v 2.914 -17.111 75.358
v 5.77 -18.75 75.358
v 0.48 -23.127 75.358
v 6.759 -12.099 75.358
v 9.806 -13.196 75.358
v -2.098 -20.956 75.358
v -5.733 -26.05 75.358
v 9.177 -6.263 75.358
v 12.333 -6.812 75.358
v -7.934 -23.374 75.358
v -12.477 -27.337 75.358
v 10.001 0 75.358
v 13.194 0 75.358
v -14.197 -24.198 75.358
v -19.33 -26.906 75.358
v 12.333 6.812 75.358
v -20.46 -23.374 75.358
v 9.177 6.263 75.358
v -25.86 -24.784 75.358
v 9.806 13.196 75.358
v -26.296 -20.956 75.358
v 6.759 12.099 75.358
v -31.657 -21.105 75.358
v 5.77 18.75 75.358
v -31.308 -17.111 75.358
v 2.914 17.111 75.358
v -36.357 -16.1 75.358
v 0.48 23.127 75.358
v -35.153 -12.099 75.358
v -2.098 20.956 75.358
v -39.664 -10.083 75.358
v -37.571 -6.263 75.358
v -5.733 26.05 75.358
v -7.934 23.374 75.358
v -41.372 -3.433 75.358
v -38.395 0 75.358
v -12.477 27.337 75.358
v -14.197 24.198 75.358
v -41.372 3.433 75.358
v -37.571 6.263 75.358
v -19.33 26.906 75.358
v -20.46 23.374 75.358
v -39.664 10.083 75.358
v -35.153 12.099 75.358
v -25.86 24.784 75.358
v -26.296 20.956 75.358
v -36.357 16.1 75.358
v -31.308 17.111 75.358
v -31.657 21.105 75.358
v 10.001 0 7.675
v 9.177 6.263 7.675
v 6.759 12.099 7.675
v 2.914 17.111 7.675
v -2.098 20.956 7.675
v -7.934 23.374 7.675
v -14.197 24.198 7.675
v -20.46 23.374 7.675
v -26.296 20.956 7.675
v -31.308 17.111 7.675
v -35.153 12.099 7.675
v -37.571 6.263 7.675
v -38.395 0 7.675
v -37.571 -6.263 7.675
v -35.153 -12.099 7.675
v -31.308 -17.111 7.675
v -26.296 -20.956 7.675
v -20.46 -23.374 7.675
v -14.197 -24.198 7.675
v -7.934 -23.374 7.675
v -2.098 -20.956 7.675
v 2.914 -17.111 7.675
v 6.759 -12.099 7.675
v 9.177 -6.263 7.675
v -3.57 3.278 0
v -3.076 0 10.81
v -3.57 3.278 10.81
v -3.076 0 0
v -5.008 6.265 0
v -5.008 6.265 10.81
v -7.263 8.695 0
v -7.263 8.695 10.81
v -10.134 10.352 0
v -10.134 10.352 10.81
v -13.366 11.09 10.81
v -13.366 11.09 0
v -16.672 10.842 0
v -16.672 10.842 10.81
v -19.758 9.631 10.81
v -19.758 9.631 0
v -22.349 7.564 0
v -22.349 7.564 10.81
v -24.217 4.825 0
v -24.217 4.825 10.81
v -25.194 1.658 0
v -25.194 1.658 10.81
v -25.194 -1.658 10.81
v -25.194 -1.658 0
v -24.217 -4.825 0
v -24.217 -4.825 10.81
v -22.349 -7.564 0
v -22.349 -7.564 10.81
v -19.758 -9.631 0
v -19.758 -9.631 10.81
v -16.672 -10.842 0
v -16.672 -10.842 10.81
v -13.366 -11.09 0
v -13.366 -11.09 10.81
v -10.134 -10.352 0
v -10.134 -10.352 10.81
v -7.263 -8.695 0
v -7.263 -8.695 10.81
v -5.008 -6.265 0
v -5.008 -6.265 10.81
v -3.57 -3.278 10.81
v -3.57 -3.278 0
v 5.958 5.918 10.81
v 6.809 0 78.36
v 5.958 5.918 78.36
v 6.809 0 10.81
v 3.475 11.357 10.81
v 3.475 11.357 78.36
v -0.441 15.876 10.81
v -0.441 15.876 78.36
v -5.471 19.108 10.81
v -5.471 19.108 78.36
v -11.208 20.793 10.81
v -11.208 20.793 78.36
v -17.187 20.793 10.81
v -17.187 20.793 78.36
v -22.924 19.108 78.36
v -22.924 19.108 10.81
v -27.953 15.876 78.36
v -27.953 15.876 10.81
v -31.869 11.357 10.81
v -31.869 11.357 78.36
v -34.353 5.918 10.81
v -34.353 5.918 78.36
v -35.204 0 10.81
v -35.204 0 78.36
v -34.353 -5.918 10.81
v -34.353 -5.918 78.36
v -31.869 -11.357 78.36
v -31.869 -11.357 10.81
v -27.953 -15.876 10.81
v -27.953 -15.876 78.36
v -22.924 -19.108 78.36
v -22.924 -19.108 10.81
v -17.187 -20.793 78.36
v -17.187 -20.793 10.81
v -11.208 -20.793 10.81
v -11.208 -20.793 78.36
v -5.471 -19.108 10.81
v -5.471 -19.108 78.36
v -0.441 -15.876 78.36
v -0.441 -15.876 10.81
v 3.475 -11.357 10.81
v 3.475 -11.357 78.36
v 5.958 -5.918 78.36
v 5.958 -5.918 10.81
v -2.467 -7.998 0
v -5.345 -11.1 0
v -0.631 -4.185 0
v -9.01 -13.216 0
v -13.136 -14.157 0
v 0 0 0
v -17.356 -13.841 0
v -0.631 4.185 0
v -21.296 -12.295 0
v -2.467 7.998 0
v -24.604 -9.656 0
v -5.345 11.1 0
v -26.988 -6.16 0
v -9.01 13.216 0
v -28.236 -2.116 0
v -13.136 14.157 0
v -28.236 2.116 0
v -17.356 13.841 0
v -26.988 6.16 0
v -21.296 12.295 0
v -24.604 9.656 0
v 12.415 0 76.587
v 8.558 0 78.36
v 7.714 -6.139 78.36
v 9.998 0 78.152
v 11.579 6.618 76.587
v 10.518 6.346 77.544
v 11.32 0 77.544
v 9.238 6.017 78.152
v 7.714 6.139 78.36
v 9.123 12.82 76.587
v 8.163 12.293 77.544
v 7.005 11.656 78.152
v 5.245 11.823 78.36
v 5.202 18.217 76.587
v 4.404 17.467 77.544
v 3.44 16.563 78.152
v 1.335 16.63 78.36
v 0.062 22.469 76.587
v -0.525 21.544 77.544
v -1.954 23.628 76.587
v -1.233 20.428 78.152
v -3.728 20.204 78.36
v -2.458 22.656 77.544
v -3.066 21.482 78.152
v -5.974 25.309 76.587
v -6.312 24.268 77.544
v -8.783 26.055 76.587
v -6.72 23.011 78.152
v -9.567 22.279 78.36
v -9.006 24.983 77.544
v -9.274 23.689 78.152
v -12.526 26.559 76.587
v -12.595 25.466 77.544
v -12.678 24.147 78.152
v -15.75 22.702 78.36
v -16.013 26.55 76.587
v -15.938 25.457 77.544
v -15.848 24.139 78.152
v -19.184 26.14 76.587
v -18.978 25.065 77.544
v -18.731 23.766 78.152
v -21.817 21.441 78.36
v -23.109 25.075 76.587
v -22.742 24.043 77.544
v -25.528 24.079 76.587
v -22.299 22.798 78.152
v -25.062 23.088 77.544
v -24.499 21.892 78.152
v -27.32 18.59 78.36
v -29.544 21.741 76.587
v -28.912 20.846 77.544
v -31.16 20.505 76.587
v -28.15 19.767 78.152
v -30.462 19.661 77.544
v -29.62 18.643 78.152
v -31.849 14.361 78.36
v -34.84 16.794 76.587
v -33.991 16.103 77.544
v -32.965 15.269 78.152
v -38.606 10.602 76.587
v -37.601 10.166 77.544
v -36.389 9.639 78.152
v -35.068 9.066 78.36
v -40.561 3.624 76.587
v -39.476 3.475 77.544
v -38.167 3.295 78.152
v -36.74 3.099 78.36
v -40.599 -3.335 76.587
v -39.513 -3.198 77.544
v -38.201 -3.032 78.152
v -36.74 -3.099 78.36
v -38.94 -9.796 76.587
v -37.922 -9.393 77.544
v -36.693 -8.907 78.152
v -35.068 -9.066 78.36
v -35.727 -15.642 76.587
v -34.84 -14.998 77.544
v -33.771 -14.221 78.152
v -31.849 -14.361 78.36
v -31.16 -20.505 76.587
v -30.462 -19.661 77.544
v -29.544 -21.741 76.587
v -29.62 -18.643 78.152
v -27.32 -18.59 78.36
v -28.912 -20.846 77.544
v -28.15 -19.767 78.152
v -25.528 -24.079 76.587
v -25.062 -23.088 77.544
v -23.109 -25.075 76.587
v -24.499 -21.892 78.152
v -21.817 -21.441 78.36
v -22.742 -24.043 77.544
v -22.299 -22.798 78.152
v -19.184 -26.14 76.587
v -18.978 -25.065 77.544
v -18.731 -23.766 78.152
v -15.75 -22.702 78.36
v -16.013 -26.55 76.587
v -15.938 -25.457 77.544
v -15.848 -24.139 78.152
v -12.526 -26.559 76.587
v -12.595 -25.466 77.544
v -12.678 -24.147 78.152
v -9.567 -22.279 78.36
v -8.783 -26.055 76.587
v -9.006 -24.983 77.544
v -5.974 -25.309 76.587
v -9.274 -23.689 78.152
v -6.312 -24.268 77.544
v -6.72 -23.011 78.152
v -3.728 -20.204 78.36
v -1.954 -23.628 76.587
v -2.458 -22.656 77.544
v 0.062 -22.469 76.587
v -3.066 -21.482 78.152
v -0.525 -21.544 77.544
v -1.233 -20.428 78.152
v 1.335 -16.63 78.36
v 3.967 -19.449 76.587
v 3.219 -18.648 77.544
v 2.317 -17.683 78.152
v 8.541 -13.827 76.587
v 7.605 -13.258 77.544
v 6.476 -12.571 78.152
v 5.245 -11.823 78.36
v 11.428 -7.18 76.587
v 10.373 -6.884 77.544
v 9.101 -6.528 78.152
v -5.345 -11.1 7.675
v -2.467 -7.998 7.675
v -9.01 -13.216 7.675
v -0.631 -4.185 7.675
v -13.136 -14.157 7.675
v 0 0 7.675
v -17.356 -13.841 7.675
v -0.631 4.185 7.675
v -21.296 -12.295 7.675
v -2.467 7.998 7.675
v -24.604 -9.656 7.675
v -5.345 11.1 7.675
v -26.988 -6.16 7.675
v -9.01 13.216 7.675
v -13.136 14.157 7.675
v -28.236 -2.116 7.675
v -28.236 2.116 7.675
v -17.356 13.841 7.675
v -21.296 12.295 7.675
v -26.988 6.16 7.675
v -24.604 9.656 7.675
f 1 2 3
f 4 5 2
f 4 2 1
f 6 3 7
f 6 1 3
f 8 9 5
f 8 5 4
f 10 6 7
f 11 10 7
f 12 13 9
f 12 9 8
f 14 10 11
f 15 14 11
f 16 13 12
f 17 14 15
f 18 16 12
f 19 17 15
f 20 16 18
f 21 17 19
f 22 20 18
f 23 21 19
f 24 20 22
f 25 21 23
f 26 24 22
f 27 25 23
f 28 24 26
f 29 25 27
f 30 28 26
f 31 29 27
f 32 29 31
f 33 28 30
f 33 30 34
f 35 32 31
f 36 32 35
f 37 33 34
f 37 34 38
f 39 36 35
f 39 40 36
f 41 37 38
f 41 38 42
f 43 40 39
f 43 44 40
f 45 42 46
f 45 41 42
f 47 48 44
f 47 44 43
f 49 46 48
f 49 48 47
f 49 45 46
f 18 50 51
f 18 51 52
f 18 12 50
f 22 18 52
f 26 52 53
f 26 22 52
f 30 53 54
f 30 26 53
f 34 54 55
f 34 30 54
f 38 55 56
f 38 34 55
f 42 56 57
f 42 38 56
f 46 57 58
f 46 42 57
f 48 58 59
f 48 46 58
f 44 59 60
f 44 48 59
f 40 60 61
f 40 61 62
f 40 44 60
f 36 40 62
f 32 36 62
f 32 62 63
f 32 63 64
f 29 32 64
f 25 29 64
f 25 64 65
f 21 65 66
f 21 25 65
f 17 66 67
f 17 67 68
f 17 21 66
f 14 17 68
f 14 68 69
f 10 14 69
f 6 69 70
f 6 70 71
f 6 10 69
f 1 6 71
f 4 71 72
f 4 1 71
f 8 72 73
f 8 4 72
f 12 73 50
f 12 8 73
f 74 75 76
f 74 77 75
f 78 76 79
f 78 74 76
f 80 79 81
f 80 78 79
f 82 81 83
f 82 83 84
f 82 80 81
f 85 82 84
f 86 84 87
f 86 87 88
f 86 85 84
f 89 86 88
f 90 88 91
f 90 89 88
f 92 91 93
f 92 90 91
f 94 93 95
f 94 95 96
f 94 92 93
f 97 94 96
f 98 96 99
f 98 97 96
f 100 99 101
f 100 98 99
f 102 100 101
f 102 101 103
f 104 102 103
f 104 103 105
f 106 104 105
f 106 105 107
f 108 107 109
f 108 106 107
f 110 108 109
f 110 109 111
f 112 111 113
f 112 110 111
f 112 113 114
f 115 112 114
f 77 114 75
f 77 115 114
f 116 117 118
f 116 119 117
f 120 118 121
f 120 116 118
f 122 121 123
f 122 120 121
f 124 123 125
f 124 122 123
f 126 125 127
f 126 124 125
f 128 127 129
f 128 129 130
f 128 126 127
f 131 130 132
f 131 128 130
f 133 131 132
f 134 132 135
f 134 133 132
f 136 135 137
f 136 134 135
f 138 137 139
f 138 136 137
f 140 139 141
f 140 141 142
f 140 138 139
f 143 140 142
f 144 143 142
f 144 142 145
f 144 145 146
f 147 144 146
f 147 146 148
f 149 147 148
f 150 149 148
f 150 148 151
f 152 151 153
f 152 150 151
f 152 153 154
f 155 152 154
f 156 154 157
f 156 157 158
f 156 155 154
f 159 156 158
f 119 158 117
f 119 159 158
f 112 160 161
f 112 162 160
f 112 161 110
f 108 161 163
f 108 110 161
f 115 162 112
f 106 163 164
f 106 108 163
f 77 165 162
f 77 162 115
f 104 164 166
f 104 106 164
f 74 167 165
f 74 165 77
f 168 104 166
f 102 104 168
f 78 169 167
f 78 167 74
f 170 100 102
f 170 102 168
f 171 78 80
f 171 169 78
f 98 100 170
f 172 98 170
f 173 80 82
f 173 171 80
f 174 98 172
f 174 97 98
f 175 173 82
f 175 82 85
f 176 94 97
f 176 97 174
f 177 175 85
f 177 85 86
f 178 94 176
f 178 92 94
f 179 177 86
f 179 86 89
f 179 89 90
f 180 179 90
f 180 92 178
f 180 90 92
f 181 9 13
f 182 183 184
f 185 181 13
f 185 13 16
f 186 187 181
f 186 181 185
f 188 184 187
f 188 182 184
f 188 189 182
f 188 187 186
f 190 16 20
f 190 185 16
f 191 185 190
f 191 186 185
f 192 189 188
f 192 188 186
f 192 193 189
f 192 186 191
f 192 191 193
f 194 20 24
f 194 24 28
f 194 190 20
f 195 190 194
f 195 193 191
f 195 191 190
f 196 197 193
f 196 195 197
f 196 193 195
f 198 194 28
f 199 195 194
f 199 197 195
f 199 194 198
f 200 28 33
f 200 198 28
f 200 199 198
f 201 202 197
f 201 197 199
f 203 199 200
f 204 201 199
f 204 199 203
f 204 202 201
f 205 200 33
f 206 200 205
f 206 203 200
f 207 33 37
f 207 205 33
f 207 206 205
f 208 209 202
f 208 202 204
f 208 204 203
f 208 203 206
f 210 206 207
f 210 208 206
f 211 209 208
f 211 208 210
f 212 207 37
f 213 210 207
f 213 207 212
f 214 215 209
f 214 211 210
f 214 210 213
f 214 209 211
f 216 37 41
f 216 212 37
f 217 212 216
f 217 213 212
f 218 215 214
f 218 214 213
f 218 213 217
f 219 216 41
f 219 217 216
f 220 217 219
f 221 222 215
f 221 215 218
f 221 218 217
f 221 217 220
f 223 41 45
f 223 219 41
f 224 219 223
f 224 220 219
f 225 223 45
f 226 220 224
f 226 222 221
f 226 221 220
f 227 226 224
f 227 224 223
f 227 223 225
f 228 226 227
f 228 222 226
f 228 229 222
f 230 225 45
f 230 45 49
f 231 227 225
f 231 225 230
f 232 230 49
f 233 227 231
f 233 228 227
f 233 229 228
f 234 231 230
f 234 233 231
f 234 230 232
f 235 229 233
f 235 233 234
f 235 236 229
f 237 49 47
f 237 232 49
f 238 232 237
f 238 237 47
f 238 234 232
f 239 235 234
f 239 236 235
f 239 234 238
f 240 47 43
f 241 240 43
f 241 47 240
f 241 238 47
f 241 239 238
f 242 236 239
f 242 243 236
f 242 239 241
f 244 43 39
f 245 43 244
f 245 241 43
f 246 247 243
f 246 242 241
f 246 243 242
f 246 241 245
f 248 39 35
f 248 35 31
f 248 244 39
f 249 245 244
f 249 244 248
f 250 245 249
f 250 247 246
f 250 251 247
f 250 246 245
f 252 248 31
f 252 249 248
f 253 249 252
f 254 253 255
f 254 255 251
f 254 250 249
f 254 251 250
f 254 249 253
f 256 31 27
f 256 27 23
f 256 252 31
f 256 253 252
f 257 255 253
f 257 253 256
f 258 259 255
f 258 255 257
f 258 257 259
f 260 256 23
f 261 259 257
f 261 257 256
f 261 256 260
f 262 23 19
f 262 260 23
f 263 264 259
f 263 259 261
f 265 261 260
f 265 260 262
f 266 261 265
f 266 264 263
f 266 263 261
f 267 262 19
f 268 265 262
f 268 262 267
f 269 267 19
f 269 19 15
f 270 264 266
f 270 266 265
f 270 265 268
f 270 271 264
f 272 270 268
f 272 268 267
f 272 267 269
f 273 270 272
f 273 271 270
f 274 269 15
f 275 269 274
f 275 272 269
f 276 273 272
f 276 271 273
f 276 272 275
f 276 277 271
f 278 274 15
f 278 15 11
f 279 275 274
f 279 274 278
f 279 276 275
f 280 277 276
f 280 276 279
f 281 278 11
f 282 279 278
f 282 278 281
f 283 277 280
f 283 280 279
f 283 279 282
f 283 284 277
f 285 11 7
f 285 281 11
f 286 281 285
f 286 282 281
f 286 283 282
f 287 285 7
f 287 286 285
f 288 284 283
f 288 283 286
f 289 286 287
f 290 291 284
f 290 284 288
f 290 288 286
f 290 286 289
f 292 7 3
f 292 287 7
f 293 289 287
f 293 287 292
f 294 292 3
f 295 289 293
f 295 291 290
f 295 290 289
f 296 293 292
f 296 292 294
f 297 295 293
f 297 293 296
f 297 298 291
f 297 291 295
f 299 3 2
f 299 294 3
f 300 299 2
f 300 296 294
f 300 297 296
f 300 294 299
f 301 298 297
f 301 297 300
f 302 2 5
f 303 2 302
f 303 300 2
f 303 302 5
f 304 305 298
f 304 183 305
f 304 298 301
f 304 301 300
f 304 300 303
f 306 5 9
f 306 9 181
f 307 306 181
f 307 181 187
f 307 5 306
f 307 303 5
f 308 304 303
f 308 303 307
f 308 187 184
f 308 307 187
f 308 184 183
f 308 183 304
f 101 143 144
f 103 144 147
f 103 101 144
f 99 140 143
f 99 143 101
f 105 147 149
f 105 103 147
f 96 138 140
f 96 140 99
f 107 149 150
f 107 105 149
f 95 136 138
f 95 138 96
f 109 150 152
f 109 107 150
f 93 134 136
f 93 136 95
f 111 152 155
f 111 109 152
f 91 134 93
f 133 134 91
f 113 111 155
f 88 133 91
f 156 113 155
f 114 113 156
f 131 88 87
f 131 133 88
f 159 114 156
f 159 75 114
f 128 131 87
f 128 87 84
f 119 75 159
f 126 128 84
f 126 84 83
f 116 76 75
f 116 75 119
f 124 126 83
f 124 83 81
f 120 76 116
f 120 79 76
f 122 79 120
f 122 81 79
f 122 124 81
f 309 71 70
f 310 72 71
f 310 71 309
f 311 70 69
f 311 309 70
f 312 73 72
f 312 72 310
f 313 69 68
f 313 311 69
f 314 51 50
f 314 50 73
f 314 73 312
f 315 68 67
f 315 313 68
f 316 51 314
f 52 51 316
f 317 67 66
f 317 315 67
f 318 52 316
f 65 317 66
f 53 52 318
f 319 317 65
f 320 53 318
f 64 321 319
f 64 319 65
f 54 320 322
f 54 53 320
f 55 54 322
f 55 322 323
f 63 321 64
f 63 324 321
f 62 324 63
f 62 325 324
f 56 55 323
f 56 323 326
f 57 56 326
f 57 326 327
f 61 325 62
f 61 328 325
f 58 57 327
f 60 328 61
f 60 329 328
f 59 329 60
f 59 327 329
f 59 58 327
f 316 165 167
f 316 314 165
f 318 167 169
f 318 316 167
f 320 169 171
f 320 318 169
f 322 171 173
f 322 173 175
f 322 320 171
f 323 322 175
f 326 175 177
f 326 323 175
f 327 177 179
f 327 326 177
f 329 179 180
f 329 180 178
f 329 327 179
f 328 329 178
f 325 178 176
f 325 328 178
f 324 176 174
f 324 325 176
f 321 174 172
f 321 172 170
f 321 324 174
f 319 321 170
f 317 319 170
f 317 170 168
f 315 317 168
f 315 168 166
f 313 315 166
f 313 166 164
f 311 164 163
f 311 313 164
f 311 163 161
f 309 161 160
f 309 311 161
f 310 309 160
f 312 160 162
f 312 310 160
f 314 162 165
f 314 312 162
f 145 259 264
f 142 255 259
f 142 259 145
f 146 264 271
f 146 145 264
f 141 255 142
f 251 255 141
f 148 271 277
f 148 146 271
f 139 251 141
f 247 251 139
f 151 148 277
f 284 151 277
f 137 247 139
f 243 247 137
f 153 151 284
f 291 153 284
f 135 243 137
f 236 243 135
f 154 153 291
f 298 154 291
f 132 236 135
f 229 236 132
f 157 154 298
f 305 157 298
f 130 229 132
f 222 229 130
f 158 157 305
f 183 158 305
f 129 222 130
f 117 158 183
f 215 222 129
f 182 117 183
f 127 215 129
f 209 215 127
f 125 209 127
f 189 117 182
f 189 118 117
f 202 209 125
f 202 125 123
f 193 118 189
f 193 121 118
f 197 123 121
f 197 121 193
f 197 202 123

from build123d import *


# Not quite as in the source:
# - a fillet or chamfer that OpenCascade refuses, or shapes differently, is made with other operations: its cross-section is extruded or revolved along the edge and cut away or added


with BuildPart() as f1:
    # F0 (on Front) → F1 (revolve)
    with BuildSketch(Plane.XZ):
        Polygon((-3.0760182999, 0), (0, 0), (0, 7.6753781177), (10.0012486801, 7.6753781177), (10.0012486801, 75.3582566977), (13.1937107071, 75.3582566977), (13.1937107071, 78.3602893353), (6.8093864247, 78.3602893353), (6.8093864247, 10.8100166544), (-3.0760182999, 10.8100166544), align=None)
    revolve(axis=Axis((-14.1970999539, 0, 39.5920351148), (0, 0, 1)))

    # F2: fillet of radius 5.08 on 1 edges, made by hand

    # F2_s1 → F2_t2 (revolve, cut)
    with BuildSketch(Plane.XZ):
        with BuildLine():
            ThreePointArc((13.1937107071, 75.3582566977), (11.3195166688, 77.544235524), (8.5581469182, 78.3602893353))
            Line((8.5581469182, 78.3602893353), (13.1937107071, 78.3602893353))
            Line((13.1937107071, 78.3602893353), (13.1937107071, 75.3582566977))
        make_face()
    revolve(axis=Axis((-14.1970999539, 0, 78.3602893353), (0, 0, 1)), mode=Mode.SUBTRACT)


solid = f1.part
